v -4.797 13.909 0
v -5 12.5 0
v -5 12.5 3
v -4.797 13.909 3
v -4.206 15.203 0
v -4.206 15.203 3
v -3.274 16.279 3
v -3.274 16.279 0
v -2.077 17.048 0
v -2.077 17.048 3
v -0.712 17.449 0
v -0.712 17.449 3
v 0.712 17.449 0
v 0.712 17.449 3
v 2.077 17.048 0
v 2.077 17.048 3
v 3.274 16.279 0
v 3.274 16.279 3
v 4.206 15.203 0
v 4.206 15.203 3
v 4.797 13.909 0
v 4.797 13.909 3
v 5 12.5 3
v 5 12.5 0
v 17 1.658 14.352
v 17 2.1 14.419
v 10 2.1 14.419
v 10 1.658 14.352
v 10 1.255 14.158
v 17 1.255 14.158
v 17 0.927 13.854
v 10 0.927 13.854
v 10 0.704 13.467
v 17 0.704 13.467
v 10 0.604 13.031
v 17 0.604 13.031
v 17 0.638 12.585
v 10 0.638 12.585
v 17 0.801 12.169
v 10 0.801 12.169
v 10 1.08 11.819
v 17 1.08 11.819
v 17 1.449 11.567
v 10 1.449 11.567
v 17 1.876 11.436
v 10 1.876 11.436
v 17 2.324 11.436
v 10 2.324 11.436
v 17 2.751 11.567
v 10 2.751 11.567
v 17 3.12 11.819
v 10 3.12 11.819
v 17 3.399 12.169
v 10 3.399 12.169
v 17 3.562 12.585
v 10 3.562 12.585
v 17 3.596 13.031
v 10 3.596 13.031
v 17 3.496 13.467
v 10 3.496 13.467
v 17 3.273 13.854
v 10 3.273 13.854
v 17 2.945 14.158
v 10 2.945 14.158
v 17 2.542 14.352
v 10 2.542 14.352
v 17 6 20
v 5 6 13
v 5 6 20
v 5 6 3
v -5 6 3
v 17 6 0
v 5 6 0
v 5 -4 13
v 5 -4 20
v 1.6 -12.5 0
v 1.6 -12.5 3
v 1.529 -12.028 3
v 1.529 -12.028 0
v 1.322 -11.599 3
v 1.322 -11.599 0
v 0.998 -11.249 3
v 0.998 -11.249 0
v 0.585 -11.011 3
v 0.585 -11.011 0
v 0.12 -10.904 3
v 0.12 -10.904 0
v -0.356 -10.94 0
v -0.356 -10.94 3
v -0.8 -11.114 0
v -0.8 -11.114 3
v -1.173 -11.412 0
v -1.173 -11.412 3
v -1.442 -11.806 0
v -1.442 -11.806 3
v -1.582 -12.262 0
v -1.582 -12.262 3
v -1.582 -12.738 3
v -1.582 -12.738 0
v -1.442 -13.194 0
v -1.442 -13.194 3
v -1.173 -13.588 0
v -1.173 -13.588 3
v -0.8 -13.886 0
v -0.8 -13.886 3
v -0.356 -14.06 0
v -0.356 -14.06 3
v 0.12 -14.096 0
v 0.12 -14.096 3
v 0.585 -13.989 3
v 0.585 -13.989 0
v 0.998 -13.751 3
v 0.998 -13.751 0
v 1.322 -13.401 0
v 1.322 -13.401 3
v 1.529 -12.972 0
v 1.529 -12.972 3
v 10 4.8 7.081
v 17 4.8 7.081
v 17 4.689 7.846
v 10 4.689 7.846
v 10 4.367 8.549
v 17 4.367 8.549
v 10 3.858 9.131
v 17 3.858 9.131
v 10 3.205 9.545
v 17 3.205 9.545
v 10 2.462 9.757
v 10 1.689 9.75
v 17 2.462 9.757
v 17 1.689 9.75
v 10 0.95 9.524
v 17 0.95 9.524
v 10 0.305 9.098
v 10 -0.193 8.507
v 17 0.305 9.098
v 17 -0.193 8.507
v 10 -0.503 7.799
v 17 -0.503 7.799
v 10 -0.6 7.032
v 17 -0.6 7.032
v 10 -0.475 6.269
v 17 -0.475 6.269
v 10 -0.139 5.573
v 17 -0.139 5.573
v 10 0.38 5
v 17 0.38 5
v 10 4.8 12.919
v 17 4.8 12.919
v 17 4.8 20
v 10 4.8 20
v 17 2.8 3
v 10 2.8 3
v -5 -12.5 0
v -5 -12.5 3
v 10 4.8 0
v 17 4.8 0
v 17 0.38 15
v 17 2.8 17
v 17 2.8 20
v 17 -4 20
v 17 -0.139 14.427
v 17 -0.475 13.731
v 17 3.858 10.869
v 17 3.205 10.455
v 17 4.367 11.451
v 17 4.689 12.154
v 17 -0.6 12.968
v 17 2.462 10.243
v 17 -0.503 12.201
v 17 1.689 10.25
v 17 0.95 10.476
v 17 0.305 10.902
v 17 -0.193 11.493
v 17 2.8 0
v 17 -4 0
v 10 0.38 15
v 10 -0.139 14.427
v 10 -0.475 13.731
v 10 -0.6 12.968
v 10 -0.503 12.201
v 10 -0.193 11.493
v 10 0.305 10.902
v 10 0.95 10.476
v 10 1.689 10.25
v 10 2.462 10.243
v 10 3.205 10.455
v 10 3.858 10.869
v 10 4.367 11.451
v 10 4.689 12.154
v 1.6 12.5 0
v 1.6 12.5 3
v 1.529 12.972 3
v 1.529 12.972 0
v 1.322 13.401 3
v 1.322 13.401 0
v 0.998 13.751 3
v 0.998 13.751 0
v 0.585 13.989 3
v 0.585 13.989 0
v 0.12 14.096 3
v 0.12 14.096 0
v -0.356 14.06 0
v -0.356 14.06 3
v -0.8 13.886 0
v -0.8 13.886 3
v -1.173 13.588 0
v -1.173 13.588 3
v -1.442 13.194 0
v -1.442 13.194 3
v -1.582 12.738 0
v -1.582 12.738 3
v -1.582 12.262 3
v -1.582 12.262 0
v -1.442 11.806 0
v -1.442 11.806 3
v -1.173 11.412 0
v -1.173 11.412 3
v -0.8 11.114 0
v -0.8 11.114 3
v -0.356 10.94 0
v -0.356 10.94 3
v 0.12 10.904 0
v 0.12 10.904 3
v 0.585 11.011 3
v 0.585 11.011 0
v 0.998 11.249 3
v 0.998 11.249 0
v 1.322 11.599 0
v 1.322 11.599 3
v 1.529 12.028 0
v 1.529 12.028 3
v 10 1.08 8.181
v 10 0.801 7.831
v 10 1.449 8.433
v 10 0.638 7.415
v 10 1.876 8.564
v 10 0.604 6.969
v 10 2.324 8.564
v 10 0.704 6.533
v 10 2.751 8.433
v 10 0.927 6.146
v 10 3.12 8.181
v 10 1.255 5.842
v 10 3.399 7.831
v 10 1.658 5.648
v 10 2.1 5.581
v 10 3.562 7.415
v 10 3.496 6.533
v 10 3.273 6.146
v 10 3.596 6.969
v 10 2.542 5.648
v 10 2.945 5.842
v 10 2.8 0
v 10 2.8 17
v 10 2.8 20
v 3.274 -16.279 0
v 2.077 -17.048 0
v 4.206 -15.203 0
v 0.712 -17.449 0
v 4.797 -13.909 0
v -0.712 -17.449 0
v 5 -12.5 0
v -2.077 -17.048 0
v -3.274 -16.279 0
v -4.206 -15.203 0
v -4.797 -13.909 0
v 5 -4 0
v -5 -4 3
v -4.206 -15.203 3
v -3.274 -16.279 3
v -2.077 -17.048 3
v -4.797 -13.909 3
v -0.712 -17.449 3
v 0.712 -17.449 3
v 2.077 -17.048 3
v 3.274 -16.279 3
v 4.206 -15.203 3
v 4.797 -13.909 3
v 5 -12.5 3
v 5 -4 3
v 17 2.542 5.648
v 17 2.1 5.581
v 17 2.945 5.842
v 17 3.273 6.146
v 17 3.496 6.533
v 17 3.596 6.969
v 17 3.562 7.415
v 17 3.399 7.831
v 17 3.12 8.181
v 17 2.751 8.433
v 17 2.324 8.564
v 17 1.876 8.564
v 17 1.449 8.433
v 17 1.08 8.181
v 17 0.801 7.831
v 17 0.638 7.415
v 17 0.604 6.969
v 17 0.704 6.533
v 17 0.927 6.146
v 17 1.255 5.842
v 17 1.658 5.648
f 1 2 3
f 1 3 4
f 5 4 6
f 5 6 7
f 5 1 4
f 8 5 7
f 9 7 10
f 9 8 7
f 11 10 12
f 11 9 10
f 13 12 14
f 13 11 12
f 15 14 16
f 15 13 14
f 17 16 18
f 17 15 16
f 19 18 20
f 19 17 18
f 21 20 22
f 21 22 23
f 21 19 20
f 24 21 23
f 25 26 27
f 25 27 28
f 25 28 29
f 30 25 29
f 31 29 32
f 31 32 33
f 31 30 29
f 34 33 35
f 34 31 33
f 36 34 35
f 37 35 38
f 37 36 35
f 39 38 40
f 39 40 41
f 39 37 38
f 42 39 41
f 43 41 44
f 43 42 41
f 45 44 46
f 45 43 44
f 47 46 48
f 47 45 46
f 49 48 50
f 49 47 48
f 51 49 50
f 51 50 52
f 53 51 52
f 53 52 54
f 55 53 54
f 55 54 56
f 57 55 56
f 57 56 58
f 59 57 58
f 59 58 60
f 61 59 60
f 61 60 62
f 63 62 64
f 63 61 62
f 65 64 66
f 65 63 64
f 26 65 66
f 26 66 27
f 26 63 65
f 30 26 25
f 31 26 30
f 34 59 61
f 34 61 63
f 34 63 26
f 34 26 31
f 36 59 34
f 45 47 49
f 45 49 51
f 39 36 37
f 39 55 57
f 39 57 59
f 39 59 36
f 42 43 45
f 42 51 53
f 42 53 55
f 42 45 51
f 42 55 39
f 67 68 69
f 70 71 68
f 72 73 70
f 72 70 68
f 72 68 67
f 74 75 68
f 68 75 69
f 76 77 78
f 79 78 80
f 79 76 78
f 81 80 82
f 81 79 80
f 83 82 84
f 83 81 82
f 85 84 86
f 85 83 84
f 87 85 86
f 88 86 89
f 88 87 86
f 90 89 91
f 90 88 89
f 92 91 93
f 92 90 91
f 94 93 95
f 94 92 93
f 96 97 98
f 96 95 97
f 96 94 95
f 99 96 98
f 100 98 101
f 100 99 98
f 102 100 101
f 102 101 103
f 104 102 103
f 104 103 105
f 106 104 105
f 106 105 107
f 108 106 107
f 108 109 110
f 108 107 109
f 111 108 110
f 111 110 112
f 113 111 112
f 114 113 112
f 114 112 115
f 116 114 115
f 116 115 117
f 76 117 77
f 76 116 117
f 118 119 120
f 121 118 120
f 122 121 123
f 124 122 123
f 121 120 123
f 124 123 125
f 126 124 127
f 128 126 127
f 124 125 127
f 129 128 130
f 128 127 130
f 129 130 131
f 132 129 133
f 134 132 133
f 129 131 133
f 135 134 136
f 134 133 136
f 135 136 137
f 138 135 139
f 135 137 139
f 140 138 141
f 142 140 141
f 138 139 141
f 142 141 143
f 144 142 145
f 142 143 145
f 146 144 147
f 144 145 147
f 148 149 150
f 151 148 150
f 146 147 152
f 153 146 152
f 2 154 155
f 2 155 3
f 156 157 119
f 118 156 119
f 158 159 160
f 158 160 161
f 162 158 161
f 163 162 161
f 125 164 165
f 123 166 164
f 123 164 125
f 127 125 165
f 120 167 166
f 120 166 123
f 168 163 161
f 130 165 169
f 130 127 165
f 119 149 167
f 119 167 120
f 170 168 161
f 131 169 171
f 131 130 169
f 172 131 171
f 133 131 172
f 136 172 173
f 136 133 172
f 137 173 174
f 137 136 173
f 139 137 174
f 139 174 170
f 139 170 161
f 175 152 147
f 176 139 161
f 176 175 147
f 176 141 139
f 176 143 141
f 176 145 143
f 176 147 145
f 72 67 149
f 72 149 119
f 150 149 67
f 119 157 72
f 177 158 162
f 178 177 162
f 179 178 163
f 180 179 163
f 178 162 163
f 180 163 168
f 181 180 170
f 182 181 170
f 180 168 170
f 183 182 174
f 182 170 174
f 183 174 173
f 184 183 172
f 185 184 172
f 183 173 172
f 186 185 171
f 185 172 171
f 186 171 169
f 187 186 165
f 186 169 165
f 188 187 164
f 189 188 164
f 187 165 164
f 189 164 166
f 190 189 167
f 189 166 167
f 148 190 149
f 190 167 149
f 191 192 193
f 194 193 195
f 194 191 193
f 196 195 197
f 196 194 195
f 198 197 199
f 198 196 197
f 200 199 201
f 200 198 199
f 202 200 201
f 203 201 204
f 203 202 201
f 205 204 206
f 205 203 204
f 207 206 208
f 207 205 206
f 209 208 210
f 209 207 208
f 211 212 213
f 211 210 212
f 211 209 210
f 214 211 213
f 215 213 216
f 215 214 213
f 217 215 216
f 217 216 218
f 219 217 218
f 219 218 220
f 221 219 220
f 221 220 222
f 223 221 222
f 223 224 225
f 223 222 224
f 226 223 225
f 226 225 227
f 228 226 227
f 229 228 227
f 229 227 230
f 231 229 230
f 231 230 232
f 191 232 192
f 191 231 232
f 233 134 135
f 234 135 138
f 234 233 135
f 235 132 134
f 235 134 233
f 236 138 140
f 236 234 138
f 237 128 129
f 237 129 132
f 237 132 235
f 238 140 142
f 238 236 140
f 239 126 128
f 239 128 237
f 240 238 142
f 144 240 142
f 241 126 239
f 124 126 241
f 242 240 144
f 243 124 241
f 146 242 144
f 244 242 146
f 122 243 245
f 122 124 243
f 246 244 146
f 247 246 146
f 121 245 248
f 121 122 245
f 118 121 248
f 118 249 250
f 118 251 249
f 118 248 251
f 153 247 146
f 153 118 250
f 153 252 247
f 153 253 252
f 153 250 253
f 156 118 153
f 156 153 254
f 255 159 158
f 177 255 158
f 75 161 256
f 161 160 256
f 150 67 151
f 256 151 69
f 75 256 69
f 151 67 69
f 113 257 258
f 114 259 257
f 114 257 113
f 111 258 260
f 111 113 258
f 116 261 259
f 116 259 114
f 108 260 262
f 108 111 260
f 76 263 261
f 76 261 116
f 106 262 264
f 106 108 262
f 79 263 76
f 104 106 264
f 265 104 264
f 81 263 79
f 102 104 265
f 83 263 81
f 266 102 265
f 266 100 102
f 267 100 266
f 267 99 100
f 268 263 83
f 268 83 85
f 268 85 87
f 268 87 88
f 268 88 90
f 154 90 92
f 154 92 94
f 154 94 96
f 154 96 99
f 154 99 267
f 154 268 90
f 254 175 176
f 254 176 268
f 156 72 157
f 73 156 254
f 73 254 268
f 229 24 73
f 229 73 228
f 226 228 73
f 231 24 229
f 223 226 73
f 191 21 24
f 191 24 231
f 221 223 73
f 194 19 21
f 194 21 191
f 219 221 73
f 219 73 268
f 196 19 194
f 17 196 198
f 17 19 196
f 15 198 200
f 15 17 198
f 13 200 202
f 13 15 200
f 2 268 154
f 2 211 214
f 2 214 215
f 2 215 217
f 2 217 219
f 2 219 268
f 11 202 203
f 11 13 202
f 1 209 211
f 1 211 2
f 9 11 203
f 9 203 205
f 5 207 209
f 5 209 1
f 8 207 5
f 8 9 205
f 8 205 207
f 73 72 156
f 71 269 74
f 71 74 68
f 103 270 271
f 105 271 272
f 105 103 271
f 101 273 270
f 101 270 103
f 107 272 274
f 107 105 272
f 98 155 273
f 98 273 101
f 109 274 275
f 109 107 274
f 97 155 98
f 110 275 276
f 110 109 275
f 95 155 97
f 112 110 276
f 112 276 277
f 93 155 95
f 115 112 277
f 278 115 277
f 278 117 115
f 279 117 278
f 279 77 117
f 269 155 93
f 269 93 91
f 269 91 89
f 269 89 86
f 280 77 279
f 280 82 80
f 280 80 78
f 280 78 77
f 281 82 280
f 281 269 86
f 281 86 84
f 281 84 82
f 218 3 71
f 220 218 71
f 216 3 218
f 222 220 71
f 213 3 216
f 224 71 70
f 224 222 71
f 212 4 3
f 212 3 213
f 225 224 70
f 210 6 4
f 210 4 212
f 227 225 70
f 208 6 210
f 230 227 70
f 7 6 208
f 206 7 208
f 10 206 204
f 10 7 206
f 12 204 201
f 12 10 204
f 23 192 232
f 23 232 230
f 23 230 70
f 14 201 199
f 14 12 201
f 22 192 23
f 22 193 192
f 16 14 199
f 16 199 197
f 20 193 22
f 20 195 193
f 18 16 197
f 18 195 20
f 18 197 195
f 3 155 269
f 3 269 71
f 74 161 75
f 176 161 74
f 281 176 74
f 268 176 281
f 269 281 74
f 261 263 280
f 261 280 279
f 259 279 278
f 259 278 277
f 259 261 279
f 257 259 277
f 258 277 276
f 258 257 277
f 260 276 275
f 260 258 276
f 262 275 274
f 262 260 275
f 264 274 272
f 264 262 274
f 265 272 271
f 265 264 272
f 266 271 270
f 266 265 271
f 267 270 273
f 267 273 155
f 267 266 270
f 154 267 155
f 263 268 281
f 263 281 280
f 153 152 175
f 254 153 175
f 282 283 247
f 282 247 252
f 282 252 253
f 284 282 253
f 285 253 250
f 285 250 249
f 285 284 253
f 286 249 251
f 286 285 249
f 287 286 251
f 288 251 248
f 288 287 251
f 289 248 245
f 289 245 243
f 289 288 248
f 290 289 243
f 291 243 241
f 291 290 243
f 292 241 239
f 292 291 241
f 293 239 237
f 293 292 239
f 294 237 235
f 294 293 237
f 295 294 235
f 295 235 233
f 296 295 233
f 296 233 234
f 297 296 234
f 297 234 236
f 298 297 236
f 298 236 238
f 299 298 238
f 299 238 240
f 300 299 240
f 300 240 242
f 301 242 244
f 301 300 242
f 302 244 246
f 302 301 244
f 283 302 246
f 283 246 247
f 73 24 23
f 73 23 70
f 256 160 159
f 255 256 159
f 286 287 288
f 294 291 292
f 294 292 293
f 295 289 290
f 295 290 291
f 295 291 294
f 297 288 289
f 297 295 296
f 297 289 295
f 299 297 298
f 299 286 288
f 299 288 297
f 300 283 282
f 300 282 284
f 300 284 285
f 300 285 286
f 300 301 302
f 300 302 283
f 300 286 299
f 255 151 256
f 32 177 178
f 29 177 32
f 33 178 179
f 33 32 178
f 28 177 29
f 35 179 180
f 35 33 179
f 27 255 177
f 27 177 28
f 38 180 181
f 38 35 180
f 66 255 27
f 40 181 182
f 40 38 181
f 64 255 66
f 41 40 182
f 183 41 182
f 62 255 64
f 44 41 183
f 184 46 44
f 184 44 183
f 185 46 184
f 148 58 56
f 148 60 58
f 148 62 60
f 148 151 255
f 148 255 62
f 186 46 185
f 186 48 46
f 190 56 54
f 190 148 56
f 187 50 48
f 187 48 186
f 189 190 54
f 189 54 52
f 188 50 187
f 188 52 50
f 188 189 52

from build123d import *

# Parameters (mm, degrees)
ESBO_O1_R                = 1.6
RESSALTO_EXTRUS_O1_DEPTH = 20
ESBO_O2_W                = 10
ESBO_O2_H                = 36.212539342
CORTE_EXTRUS_O1_DEPTH    = 17
CHANFRO1_SIZE            = 10
ESBO_O3_R                = 1.5
CORTE_EXTRUS_O2_DEPTH    = 7


with BuildPart() as part:
    # Esboço1 → Ressalto-extrusão1 (new body)
    with BuildSketch(Plane.XY):
        with BuildLine():
            Line((5, 12.5), (5, 6))
            Line((5, 6), (17, 6))
            Line((17, 6), (17, -4))
            Line((17, -4), (5, -4))
            Line((5, -4), (5, -12.5))
            ThreePointArc((5, -12.5), (0, -17.5), (-5, -12.5))
            Line((-5, -12.5), (-5, 12.5))
            ThreePointArc((-5, 12.5), (0, 17.5), (5, 12.5))
        make_face()
        with Locations((0, -12.5)):
            Circle(ESBO_O1_R, mode=Mode.SUBTRACT)
        with Locations((0, 12.5)):
            Circle(ESBO_O1_R, mode=Mode.SUBTRACT)
    extrude(amount=RESSALTO_EXTRUS_O1_DEPTH)

    # Esboço2 → Corte-extrusão1 (cut)
    with BuildSketch(Plane.XY.offset(20)):
        Rectangle(ESBO_O2_W, ESBO_O2_H)
    extrude(amount=-CORTE_EXTRUS_O1_DEPTH, mode=Mode.SUBTRACT)

    # Chanfro1
    chanfro1_edges = [part.edges().sort_by_distance(p)[0] for p in [
        (5, 1, 3),
    ]]
    chamfer(chanfro1_edges, length=CHANFRO1_SIZE - 0.0001)  # a hair under: the kernel refuses the full size

    # Esboço3 → Corte-extrusão2 (cut)
    # profile 1 of 2: a face of its own
    with BuildSketch(Plane(origin=(17, 0, 0), x_dir=(0, 0, -1), z_dir=(1, 0, 0))):
        with BuildLine():
            Line((0, 4.8), (-7.081235465, 4.8))
            ThreePointArc((-7.081235465, 4.8), (-9.523984558, 0.949792684), (-5, 0.379982867))
            Line((-5, 0.379982867), (-3, 2.8))
            Line((-3, 2.8), (0, 2.8))
            Line((0, 2.8), (0, 4.8))
        make_face()
        with Locations((-7.081235465, 2.1)):
            Circle(ESBO_O3_R, mode=Mode.SUBTRACT)
    # profile 2 of 2: a face of its own
    with BuildSketch(Plane(origin=(17, 0, 0), x_dir=(0, 0, -1), z_dir=(1, 0, 0))):
        with BuildLine():
            Line((-20, 4.8), (-20, 2.8))
            Line((-20, 2.8), (-17, 2.8))
            Line((-17, 2.8), (-15, 0.379982867))
            ThreePointArc((-15, 0.379982867), (-10.476015442, 0.949792684), (-12.918764535, 4.8))
            Line((-12.918764535, 4.8), (-20, 4.8))
        make_face()
        with Locations(Location((-12.918764535, 2.1, 0), (0, 0, 180))):
            Circle(ESBO_O3_R, mode=Mode.SUBTRACT)
    extrude(amount=-CORTE_EXTRUS_O2_DEPTH, mode=Mode.SUBTRACT)


solid = part.part
